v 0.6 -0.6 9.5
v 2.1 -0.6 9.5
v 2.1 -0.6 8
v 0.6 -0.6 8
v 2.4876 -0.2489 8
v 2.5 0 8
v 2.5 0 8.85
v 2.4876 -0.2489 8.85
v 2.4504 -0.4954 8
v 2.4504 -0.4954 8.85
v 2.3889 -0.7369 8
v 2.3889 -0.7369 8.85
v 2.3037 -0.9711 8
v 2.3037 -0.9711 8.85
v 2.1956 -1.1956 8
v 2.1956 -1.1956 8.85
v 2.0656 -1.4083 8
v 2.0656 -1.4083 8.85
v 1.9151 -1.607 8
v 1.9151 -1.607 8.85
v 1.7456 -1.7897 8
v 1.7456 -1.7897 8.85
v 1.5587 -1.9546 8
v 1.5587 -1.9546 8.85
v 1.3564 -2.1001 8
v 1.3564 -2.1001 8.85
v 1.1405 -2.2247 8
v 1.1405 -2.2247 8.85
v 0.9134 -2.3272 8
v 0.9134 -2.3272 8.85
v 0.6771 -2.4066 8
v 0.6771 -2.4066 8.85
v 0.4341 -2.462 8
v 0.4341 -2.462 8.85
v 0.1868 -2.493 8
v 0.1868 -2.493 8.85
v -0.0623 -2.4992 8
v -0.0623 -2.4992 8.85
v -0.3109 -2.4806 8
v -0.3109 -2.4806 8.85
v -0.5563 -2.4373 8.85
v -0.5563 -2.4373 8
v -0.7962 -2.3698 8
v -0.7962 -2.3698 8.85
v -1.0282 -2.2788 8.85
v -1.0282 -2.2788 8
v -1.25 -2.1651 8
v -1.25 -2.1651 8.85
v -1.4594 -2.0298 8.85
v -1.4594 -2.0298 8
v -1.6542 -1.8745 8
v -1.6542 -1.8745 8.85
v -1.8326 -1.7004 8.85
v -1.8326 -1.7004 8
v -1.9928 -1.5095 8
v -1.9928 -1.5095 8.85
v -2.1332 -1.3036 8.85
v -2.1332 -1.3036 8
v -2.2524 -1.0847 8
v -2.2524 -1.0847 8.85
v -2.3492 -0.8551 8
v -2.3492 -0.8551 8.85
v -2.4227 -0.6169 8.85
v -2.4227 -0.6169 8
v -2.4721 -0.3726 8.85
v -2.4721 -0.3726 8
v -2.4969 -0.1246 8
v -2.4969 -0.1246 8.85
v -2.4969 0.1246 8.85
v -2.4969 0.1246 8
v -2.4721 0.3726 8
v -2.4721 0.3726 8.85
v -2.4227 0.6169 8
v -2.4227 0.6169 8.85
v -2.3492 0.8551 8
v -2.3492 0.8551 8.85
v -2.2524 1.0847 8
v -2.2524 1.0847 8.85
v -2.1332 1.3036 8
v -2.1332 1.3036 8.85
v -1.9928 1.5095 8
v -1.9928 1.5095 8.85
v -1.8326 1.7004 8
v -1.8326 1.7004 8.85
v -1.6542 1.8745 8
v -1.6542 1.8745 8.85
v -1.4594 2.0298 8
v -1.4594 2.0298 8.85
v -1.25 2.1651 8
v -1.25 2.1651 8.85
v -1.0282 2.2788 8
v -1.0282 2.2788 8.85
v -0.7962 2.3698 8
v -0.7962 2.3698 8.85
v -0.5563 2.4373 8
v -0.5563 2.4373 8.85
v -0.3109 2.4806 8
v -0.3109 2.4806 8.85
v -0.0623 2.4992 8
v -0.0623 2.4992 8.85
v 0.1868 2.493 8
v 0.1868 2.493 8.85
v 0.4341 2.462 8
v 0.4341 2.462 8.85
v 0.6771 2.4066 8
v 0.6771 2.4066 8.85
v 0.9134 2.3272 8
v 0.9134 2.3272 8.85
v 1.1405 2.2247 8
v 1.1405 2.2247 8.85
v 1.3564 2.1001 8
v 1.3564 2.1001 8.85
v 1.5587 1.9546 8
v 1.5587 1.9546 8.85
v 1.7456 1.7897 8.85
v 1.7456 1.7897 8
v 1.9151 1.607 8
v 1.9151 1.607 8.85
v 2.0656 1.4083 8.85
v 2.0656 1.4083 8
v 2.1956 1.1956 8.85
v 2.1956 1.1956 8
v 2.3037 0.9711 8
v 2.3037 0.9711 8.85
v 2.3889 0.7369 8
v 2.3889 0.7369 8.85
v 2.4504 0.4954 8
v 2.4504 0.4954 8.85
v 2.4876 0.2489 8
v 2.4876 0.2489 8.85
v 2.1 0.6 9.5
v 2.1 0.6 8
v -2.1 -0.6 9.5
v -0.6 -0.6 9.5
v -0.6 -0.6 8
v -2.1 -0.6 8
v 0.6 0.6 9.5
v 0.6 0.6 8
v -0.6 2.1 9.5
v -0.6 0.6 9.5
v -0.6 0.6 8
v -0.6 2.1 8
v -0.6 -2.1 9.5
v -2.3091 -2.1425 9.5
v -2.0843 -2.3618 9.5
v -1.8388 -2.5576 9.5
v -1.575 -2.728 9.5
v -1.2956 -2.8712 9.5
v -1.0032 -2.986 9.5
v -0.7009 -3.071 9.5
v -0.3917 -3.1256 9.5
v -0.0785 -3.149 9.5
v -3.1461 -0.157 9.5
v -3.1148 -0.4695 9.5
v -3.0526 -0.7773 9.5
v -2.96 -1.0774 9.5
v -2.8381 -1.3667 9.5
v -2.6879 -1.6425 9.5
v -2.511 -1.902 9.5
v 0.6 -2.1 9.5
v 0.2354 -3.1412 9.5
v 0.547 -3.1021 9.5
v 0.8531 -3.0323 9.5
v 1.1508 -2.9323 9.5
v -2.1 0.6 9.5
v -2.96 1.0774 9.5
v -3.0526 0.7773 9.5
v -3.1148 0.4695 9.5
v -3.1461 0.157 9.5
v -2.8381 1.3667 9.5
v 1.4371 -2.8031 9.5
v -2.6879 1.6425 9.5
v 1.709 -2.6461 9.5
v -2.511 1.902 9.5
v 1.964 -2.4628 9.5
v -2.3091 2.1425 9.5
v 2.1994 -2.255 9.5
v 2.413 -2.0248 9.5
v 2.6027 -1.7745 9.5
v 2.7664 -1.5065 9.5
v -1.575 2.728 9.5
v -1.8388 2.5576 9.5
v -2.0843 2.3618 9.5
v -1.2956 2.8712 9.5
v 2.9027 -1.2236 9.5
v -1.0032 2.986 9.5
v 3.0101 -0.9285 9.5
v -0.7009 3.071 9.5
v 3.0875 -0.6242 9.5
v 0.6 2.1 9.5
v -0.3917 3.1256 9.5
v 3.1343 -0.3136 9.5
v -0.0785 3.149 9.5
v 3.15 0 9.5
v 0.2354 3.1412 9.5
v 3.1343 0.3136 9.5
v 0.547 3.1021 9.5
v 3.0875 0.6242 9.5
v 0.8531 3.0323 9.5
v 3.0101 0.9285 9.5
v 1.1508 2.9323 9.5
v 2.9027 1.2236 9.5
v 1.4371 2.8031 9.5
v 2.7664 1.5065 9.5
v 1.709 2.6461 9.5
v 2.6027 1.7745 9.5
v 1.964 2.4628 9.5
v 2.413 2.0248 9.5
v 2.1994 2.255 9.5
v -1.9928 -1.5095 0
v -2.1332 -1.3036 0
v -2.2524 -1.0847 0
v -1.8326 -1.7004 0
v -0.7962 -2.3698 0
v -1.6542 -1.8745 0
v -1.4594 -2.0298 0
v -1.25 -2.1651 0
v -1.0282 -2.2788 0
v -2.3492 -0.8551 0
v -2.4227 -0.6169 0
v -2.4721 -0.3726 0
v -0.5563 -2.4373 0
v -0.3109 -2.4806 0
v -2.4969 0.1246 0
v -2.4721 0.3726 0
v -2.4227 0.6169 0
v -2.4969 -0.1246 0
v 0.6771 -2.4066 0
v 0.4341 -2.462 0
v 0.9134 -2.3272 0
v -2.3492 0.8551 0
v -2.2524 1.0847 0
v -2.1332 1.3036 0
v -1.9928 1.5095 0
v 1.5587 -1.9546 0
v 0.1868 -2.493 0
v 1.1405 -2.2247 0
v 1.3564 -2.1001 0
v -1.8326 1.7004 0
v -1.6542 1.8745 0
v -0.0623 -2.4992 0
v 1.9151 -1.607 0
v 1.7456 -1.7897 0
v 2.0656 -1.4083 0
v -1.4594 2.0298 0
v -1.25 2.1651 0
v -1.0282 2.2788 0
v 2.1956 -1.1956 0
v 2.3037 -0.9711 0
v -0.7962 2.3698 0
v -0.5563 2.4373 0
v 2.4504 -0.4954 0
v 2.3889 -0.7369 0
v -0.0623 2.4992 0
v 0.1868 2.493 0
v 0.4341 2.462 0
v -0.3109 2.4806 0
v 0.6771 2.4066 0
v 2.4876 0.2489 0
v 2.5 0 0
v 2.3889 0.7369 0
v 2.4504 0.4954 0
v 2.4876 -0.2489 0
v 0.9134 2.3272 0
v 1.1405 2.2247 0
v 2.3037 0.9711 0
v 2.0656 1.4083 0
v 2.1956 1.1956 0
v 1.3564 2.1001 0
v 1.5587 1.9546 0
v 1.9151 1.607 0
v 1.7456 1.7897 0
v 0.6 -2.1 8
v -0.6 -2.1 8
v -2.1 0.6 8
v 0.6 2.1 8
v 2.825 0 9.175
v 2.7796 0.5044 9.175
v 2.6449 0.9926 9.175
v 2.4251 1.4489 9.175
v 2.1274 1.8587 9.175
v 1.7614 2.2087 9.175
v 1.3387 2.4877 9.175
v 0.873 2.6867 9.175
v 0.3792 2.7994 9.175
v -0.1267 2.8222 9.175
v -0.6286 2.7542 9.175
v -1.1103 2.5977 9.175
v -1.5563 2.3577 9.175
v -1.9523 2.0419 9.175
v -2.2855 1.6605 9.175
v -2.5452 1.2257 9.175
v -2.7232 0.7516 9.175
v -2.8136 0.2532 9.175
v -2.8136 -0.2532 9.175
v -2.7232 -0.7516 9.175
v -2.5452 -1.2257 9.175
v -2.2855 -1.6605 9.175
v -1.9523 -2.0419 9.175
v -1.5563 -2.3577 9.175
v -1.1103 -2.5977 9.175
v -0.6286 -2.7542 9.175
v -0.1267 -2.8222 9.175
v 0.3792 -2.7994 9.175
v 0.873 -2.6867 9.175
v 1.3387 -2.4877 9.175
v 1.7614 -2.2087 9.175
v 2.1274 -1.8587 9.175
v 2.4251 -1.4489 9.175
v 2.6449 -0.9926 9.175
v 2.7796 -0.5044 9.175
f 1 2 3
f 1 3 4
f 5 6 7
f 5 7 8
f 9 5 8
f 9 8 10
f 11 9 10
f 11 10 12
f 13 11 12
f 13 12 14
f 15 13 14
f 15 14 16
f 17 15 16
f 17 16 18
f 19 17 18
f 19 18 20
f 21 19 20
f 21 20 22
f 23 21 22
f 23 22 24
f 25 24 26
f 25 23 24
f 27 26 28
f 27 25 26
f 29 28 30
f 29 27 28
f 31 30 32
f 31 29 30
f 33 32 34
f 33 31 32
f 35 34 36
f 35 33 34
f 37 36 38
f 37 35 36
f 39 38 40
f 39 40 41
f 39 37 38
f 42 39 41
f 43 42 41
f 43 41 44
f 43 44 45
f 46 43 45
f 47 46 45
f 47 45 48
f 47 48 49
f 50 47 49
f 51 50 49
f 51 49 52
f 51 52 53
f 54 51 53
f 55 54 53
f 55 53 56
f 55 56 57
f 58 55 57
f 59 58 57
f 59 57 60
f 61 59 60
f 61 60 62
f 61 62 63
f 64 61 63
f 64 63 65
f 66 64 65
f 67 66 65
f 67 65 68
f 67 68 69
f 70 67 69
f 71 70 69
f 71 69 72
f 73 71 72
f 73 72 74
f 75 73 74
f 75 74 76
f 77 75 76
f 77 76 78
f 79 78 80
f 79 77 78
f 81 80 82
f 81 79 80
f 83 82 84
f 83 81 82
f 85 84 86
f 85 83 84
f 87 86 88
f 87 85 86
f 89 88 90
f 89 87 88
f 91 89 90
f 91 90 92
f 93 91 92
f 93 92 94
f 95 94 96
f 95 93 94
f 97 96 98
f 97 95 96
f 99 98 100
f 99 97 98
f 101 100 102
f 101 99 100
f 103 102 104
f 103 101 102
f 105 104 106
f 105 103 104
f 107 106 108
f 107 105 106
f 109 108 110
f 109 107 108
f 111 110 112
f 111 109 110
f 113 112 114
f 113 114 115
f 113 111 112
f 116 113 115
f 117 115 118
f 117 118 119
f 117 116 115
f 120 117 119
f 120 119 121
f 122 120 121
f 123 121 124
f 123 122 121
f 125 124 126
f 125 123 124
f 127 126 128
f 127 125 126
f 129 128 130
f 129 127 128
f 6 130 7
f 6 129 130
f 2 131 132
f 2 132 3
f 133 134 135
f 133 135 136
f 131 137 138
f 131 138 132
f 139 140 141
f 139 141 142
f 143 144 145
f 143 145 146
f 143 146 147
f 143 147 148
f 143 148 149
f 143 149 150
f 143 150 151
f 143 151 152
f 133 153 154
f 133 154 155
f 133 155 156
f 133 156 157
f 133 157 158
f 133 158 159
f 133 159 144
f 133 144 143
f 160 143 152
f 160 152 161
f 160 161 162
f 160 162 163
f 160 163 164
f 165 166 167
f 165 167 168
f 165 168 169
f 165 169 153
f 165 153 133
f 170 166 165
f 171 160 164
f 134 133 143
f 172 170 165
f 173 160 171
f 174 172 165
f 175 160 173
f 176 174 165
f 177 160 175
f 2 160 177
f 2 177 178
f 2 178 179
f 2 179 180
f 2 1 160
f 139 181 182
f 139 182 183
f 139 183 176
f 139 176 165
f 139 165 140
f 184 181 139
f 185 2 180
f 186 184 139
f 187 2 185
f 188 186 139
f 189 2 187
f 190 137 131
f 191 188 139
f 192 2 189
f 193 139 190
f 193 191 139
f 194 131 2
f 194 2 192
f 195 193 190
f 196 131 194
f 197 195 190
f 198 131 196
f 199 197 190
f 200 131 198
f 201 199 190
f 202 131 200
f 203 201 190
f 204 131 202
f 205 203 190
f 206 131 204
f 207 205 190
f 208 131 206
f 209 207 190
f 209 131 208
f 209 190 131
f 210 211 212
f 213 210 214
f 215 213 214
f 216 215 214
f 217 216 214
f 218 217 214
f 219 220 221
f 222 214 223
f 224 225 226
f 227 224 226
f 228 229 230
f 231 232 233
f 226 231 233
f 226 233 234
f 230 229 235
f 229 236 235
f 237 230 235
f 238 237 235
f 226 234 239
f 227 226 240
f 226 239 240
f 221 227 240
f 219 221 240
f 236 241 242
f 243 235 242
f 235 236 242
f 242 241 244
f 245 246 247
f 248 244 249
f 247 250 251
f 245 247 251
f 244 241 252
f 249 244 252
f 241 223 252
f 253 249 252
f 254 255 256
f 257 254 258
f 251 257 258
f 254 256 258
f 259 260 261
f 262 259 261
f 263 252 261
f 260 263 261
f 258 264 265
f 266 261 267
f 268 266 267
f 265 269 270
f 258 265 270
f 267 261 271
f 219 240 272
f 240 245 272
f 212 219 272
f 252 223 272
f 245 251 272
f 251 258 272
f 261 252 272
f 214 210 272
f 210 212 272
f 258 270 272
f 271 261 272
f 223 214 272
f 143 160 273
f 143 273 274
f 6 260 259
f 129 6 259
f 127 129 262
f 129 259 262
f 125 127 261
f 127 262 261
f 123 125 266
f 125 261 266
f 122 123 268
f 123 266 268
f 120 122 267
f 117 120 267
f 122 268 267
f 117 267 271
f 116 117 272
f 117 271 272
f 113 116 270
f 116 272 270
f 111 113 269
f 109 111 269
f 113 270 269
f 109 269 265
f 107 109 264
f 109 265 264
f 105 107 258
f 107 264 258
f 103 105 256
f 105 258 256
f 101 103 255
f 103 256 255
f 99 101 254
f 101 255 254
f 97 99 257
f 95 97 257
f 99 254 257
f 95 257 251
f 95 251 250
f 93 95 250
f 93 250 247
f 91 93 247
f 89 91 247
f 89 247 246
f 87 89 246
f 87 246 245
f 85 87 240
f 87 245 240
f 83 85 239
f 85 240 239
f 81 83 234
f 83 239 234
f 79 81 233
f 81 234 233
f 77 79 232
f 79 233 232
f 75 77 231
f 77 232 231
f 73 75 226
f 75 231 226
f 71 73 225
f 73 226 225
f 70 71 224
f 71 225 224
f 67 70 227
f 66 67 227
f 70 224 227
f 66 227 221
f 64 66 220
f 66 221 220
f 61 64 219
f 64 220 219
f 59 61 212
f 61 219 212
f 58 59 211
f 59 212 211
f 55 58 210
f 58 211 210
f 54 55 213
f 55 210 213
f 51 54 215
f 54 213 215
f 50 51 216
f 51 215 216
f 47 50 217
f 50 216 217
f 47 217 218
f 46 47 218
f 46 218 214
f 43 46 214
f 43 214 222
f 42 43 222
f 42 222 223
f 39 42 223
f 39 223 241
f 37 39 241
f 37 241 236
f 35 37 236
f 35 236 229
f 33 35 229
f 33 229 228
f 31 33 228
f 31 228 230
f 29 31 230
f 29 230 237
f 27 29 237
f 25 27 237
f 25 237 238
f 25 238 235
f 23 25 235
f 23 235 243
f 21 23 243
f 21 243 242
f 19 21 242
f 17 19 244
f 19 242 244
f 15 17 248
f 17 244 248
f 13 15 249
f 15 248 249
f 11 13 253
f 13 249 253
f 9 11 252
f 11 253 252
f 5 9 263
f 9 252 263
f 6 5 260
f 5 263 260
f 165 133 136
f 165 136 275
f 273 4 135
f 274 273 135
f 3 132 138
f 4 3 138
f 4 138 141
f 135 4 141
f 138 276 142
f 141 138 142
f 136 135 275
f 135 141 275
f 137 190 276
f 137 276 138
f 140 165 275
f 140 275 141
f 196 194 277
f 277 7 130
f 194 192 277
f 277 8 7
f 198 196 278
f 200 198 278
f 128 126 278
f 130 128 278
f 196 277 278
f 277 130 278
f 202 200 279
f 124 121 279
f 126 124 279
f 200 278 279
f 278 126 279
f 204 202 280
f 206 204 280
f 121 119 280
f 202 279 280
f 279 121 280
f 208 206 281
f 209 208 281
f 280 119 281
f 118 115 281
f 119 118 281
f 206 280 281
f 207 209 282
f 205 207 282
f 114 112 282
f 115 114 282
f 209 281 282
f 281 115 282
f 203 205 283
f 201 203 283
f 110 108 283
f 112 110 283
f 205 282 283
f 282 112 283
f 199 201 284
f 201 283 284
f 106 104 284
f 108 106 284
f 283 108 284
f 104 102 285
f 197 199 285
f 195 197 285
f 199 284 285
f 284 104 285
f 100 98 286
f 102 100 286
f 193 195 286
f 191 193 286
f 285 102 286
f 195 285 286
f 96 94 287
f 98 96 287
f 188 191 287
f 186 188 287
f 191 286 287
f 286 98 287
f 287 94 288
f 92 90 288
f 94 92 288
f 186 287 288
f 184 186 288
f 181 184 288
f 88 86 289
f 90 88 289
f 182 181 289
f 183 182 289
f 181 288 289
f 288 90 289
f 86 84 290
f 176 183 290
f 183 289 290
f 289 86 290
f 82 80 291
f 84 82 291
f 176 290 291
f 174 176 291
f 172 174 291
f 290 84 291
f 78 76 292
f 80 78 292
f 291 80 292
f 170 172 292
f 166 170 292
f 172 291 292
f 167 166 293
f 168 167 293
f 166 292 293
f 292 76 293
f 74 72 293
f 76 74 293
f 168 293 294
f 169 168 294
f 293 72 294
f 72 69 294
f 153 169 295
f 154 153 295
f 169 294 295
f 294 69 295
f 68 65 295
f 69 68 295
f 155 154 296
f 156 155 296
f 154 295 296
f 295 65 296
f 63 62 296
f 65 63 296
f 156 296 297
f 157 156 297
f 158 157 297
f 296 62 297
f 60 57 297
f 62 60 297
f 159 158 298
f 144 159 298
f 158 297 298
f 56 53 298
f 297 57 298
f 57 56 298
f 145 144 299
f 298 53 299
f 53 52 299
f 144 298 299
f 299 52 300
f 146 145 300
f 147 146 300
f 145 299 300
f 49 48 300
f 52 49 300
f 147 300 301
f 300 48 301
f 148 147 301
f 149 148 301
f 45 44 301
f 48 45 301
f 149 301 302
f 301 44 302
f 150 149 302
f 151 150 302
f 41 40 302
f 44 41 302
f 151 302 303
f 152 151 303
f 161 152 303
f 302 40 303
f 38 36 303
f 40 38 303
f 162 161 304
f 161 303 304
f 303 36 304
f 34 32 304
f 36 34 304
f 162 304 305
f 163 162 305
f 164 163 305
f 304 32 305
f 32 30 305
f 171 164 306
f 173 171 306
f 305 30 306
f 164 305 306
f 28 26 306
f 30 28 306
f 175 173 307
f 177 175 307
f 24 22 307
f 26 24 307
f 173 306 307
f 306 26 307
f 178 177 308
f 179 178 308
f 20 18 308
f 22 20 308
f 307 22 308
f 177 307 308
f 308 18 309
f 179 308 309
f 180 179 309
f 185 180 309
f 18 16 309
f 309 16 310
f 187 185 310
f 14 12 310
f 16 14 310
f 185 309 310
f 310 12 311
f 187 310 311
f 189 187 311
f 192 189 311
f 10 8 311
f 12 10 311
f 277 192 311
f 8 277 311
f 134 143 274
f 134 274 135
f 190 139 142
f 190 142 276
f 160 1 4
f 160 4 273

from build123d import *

# Parameters (mm, degrees)
ESQUISSE1_R             = 2.5
BOSS_EXTRU_1_DEPTH      = 8
ESQUISSE2_R             = 3.15
BOSS_EXTRU_2_DEPTH      = 1.5
CHANFREIN1_SIZE         = 1.5
ENL_V_MAT_EXTRU_1_DEPTH = 1.5


with BuildPart() as part:
    # Esquisse1 → Boss.-Extru.1 (new body)
    with BuildSketch(Plane.XY):
        Circle(ESQUISSE1_R)
    extrude(amount=BOSS_EXTRU_1_DEPTH)

    # Esquisse2 → Boss.-Extru.2 (add)
    with BuildSketch(Plane.XY.offset(8)):
        Circle(ESQUISSE2_R)
    extrude(amount=BOSS_EXTRU_2_DEPTH)

    # Chanfrein1
    # the kernel refuses this chamfer: 1.5 mm, written as the material it takes off along each edge
    with BuildSketch(Plane(origin=(0, 0, 8), x_dir=(1, 0, 0), z_dir=(0, -1, 0))) as chanfrein1_piece_1_section:
        Polygon((3.15, CHANFREIN1_SIZE), (3.15 - CHANFREIN1_SIZE, 0), (3.15, 0), align=None)
    chanfrein1_piece_1 = revolve(axis=Axis((0, 0, 8), (0, 0, 1)), mode=Mode.PRIVATE)
    chanfrein1_piece_1 = chanfrein1_piece_1 - Plane(origin=(0, 0, 9.178723354), x_dir=(1, 0, 0), z_dir=(0, 0, -1)) * Cylinder(2.5, 13, mode=Mode.PRIVATE)
    add(chanfrein1_piece_1, mode=Mode.SUBTRACT)

    # Esquisse3 → Enlèv. mat.-Extru.1 (cut)
    with BuildSketch(Plane.XY.offset(9.5)):
        Polygon((-0.6, 2.1), (0.6, 2.1), (0.6, 0.6), (2.1, 0.6), (2.1, -0.6), (0.6, -0.6), (0.6, -2.1), (-0.6, -2.1), (-0.6, -0.6), (-2.1, -0.6), (-2.1, 0.6), (-0.6, 0.6), align=None)
    extrude(amount=-ENL_V_MAT_EXTRU_1_DEPTH, mode=Mode.SUBTRACT)


solid = part.part
